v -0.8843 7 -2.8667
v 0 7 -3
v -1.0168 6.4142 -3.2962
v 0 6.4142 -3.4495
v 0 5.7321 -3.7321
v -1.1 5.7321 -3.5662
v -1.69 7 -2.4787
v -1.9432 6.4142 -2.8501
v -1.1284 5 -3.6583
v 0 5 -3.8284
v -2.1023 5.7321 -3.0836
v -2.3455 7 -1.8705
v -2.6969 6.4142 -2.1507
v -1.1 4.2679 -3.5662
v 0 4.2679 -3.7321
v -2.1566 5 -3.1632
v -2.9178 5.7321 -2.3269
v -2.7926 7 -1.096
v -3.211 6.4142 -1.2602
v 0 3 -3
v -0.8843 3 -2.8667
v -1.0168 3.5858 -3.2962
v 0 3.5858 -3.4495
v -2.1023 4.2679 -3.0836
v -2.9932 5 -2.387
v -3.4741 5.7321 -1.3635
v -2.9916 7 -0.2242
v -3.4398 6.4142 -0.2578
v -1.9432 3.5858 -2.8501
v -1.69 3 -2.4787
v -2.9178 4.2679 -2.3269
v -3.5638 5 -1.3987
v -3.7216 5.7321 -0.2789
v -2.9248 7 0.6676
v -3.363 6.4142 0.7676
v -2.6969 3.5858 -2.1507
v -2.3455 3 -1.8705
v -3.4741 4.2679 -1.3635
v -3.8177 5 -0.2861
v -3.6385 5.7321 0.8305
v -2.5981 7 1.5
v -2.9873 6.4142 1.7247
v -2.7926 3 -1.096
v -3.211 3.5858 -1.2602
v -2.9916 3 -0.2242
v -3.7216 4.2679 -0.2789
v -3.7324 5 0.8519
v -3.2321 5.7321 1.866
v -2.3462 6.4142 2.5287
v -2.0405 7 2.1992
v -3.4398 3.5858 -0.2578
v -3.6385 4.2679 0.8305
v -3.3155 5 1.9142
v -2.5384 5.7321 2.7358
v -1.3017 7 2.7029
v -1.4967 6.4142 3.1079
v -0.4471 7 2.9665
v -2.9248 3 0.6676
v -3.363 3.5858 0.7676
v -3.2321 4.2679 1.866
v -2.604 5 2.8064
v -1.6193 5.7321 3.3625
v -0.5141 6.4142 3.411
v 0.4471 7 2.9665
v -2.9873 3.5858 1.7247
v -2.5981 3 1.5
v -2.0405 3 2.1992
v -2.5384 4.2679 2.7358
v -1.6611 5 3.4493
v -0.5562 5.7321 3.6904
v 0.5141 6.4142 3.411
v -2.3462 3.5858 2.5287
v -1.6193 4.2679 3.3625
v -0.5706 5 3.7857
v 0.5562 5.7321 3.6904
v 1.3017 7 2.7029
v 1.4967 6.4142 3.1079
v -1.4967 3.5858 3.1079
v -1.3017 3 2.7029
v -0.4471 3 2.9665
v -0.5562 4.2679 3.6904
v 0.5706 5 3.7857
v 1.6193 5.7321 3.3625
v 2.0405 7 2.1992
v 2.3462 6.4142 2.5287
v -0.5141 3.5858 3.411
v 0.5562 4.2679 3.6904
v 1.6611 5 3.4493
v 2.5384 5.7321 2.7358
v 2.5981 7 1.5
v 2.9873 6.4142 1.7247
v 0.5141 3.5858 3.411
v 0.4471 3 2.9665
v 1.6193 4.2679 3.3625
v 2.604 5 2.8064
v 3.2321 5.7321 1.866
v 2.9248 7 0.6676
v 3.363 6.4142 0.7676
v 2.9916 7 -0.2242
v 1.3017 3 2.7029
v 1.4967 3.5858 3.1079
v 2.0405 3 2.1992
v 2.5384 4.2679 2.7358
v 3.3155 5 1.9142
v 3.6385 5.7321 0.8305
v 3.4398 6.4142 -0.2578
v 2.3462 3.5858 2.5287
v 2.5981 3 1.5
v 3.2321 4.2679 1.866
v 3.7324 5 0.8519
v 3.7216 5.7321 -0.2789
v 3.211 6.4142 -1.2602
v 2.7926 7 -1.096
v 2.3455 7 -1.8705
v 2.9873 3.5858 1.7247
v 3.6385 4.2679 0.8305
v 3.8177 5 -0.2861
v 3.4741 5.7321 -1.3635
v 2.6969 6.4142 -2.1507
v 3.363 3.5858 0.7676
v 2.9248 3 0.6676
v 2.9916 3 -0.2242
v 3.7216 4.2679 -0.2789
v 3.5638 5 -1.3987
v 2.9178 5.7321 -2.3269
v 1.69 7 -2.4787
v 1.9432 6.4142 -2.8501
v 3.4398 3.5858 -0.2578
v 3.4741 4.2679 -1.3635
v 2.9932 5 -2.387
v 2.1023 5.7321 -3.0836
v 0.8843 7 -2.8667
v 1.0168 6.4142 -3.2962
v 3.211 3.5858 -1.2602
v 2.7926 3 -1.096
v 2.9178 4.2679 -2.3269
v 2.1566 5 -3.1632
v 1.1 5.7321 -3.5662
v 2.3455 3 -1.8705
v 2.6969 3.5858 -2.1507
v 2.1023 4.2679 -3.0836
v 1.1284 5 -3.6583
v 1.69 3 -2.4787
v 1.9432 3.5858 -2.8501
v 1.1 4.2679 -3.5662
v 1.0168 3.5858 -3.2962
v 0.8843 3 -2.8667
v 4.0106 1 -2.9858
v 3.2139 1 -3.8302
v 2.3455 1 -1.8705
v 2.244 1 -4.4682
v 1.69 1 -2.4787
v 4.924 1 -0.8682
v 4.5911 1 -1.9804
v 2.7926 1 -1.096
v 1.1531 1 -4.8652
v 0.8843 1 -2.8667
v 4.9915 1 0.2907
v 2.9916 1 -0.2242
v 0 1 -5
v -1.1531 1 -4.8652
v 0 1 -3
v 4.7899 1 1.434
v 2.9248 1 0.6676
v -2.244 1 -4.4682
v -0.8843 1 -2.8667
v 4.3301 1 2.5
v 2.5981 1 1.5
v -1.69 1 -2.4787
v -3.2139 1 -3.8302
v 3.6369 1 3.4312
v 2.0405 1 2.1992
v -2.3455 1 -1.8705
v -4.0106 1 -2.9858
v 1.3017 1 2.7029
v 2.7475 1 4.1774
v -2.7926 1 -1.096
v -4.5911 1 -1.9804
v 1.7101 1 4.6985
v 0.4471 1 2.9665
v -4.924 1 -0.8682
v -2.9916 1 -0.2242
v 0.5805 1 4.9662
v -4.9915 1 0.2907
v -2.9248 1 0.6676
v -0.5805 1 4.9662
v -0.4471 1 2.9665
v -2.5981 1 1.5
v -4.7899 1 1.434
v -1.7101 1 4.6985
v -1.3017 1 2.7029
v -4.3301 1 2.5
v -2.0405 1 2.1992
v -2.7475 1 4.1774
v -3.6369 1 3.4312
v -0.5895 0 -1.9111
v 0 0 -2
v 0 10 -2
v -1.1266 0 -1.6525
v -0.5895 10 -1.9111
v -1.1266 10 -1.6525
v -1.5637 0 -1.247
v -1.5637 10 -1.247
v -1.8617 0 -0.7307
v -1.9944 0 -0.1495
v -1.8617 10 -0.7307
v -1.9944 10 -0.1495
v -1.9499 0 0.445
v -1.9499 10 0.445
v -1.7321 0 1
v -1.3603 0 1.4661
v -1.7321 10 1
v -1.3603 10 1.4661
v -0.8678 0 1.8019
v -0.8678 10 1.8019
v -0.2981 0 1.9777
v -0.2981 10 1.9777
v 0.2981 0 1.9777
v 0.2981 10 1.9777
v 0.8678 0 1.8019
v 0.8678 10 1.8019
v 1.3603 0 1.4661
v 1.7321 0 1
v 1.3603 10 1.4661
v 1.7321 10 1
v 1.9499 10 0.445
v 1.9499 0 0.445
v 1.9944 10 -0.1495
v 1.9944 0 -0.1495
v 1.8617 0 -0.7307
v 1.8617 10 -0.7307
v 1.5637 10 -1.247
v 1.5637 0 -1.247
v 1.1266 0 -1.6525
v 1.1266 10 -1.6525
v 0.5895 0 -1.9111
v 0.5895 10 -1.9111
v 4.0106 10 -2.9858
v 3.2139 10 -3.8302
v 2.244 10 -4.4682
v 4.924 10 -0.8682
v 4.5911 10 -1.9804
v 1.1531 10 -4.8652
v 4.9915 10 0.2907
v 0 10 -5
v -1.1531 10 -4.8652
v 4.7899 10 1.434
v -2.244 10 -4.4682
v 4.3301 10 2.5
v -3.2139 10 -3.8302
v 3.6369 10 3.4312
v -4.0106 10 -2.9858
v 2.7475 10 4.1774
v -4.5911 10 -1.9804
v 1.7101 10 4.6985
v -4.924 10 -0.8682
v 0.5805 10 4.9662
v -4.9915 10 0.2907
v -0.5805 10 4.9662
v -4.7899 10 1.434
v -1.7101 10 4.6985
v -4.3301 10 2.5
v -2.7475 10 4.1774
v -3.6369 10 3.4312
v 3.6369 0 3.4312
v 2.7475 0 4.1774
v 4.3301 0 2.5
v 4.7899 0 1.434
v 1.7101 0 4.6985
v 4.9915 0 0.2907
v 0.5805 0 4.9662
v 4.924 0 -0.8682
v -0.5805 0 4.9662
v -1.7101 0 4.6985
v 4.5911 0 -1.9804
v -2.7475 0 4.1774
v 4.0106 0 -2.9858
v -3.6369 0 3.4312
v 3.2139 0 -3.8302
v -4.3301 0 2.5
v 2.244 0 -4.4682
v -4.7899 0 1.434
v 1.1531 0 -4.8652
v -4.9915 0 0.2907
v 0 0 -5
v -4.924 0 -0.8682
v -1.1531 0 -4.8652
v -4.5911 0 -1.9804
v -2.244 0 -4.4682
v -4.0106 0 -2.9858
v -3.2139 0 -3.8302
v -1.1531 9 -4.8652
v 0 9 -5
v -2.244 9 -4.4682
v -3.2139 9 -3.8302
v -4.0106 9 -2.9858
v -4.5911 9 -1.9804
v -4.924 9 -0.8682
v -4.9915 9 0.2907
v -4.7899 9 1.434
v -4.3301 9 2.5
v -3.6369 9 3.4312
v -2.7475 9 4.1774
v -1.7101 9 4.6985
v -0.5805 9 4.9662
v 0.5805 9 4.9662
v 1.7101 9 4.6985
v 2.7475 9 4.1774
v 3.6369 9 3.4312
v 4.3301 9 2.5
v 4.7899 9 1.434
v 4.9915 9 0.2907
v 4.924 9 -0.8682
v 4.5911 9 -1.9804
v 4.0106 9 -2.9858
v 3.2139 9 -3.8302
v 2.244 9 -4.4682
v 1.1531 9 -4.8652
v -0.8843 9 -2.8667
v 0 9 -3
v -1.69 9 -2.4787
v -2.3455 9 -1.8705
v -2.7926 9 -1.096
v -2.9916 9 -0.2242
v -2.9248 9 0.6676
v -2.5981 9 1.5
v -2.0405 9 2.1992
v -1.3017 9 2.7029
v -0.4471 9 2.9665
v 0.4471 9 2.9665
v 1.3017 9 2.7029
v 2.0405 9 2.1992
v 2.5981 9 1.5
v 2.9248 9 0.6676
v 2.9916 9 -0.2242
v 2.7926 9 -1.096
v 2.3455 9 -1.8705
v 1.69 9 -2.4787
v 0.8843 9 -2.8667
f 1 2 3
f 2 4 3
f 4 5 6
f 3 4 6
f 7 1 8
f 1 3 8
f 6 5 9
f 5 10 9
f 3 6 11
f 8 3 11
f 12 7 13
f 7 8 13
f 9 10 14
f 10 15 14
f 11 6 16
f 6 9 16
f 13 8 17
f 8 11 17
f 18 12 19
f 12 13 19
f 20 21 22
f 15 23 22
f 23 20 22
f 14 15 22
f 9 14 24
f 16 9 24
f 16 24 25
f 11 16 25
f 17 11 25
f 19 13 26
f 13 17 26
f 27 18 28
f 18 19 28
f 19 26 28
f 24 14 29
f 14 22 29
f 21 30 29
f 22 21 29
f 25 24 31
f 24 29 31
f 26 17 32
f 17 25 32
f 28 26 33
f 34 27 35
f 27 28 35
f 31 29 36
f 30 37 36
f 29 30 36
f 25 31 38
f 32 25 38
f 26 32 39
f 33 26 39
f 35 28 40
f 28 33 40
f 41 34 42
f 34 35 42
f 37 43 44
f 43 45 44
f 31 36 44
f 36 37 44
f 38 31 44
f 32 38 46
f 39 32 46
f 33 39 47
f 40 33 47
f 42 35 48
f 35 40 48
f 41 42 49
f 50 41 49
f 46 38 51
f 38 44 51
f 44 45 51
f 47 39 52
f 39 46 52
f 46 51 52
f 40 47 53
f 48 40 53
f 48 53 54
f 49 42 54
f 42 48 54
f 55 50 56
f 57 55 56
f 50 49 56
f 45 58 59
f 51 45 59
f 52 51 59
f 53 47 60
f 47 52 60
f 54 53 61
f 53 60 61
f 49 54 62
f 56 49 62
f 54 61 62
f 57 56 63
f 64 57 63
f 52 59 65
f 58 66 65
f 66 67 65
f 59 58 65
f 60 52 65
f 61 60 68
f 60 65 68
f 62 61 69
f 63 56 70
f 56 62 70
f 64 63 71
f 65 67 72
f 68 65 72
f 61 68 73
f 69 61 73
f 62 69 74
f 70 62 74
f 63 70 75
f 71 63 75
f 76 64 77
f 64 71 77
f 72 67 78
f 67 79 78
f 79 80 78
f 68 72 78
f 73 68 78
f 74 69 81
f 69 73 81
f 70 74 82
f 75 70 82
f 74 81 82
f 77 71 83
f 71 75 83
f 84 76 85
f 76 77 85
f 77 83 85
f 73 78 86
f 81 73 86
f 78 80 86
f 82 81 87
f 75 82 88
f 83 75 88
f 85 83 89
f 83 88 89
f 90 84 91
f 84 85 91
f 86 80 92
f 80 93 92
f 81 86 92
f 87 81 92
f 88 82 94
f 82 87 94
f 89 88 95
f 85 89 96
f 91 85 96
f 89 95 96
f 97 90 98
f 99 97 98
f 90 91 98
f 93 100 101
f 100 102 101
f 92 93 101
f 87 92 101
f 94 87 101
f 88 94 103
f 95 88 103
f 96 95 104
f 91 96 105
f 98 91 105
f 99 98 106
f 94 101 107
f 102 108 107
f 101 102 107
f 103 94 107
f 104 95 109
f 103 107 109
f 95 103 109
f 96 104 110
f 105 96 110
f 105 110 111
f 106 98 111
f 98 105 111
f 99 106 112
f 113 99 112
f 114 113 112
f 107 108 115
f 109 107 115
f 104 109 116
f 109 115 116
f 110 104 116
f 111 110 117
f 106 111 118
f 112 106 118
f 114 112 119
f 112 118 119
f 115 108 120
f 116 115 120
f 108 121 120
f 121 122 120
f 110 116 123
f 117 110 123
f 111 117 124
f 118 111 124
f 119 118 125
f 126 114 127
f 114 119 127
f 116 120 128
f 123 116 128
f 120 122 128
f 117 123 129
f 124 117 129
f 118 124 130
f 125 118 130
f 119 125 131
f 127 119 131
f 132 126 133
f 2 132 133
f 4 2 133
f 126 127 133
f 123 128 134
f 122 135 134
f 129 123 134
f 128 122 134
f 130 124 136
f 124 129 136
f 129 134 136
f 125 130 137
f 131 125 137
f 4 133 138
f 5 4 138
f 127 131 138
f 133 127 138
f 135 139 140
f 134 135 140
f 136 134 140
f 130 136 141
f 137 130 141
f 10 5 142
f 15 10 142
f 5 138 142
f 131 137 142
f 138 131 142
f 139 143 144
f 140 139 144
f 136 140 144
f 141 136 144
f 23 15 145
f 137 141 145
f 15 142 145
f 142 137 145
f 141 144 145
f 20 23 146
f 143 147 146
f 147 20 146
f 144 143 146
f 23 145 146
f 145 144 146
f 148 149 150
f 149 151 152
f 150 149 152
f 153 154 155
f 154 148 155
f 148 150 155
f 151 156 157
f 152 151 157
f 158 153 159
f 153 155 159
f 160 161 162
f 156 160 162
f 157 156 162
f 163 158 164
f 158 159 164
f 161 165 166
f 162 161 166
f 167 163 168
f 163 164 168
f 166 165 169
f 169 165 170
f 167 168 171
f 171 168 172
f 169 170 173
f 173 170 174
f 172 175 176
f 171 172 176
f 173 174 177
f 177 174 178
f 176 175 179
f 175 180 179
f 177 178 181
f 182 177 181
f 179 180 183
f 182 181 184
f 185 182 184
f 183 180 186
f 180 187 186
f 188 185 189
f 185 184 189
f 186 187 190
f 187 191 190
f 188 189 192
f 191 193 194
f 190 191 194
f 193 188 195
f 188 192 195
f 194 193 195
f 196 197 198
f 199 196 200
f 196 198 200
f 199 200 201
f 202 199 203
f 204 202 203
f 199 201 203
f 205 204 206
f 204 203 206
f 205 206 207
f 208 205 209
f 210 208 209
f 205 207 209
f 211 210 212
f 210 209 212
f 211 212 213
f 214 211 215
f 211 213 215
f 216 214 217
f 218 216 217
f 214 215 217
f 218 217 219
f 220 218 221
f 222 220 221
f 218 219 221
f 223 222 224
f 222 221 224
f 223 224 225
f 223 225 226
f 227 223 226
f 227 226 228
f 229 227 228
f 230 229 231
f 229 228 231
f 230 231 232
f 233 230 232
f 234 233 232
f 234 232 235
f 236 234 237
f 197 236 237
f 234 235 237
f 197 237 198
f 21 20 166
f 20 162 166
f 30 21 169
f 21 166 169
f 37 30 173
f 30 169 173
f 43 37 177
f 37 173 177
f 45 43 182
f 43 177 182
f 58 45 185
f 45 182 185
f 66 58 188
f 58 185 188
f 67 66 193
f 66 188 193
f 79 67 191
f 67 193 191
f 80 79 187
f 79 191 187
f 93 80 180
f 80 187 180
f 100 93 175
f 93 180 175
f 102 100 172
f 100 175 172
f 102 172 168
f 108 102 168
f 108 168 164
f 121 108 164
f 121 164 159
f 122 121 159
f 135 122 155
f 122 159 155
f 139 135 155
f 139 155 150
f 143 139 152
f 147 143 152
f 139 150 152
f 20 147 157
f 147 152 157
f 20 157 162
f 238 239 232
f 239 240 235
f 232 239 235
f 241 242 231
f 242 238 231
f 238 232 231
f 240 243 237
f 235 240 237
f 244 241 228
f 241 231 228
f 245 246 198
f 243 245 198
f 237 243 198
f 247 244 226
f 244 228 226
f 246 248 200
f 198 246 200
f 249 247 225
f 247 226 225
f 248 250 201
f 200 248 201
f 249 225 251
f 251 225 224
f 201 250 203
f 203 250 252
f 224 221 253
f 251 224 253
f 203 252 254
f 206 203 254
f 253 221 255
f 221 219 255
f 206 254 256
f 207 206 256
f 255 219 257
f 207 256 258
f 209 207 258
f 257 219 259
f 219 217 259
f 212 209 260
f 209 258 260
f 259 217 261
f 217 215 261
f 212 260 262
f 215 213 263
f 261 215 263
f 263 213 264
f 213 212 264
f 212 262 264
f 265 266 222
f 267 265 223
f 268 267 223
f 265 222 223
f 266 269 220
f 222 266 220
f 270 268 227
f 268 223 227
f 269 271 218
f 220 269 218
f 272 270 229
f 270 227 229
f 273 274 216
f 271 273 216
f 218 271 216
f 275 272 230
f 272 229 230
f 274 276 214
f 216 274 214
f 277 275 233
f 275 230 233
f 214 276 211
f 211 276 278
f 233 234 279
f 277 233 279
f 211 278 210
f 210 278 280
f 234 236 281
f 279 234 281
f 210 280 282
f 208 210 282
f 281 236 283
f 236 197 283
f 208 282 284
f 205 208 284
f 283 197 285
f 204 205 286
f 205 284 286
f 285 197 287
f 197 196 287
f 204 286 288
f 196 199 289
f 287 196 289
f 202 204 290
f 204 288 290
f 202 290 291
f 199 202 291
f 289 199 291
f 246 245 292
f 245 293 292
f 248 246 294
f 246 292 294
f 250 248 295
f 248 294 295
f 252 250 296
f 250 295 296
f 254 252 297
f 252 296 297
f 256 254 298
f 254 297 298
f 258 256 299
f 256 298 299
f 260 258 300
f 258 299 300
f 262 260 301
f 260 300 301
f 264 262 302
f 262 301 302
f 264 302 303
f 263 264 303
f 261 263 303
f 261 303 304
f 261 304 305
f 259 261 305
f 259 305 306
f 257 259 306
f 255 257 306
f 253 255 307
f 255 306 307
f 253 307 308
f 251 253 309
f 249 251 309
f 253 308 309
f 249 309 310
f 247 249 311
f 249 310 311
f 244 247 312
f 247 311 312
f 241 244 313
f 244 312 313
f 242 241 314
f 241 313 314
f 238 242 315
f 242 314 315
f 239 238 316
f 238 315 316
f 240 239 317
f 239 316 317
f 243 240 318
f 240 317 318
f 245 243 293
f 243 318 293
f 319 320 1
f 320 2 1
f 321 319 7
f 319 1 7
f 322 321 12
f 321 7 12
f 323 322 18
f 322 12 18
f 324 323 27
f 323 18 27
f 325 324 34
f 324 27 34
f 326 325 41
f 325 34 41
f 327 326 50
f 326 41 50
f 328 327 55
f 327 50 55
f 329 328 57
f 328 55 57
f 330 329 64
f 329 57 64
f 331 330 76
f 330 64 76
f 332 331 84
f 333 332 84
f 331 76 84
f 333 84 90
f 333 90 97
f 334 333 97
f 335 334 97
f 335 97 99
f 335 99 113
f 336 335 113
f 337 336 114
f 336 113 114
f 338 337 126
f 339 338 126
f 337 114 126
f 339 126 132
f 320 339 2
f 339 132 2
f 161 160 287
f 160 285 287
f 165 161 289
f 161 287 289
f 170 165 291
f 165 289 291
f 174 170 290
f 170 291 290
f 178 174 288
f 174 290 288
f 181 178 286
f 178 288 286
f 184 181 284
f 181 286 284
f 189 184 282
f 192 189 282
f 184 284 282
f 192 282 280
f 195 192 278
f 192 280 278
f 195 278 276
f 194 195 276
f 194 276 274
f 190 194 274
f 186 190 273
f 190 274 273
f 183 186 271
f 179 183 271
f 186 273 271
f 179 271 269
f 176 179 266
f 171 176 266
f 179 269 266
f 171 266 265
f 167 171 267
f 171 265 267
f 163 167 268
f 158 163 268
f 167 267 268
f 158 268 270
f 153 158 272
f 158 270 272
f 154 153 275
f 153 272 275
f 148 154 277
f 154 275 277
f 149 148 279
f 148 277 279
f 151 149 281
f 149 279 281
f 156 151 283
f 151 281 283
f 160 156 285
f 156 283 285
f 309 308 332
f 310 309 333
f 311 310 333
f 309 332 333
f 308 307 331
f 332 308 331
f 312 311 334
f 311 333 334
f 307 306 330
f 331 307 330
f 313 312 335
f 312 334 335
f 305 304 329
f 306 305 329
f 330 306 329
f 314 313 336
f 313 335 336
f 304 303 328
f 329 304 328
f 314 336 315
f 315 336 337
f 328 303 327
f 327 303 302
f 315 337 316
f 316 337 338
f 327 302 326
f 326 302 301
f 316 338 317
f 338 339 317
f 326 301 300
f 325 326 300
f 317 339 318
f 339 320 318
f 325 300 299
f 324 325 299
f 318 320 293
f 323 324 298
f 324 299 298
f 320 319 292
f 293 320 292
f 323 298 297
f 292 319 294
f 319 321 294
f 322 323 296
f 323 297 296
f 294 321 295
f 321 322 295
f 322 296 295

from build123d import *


with BuildPart() as part:
    # Croquis1 → Revolución1 (revolve)
    with BuildSketch(Plane.XY, mode=Mode.PRIVATE) as revoluci_n1_sk:
        with BuildLine():
            Line((-2, 10), (-5, 10))
            Line((-5, 10), (-5, 9))
            Line((-5, 9), (-3, 9))
            Line((-3, 9), (-3, 7))
            ThreePointArc((-3, 7), (-3.828427125, 5), (-3, 3))
            Line((-3, 3), (-3, 1))
            Line((-3, 1), (-5, 1))
            Line((-5, 1), (-5, 0))
            Line((-5, 0), (-2, 0))
            Line((-2, 0), (-2, 10))
        make_face()
    revolve(revoluci_n1_sk.sketch.rotate(Axis((0, 0, 0), (0, 1, 0)), 270), axis=Axis((0, 0, 0), (0, 1, 0)))


solid = part.part
